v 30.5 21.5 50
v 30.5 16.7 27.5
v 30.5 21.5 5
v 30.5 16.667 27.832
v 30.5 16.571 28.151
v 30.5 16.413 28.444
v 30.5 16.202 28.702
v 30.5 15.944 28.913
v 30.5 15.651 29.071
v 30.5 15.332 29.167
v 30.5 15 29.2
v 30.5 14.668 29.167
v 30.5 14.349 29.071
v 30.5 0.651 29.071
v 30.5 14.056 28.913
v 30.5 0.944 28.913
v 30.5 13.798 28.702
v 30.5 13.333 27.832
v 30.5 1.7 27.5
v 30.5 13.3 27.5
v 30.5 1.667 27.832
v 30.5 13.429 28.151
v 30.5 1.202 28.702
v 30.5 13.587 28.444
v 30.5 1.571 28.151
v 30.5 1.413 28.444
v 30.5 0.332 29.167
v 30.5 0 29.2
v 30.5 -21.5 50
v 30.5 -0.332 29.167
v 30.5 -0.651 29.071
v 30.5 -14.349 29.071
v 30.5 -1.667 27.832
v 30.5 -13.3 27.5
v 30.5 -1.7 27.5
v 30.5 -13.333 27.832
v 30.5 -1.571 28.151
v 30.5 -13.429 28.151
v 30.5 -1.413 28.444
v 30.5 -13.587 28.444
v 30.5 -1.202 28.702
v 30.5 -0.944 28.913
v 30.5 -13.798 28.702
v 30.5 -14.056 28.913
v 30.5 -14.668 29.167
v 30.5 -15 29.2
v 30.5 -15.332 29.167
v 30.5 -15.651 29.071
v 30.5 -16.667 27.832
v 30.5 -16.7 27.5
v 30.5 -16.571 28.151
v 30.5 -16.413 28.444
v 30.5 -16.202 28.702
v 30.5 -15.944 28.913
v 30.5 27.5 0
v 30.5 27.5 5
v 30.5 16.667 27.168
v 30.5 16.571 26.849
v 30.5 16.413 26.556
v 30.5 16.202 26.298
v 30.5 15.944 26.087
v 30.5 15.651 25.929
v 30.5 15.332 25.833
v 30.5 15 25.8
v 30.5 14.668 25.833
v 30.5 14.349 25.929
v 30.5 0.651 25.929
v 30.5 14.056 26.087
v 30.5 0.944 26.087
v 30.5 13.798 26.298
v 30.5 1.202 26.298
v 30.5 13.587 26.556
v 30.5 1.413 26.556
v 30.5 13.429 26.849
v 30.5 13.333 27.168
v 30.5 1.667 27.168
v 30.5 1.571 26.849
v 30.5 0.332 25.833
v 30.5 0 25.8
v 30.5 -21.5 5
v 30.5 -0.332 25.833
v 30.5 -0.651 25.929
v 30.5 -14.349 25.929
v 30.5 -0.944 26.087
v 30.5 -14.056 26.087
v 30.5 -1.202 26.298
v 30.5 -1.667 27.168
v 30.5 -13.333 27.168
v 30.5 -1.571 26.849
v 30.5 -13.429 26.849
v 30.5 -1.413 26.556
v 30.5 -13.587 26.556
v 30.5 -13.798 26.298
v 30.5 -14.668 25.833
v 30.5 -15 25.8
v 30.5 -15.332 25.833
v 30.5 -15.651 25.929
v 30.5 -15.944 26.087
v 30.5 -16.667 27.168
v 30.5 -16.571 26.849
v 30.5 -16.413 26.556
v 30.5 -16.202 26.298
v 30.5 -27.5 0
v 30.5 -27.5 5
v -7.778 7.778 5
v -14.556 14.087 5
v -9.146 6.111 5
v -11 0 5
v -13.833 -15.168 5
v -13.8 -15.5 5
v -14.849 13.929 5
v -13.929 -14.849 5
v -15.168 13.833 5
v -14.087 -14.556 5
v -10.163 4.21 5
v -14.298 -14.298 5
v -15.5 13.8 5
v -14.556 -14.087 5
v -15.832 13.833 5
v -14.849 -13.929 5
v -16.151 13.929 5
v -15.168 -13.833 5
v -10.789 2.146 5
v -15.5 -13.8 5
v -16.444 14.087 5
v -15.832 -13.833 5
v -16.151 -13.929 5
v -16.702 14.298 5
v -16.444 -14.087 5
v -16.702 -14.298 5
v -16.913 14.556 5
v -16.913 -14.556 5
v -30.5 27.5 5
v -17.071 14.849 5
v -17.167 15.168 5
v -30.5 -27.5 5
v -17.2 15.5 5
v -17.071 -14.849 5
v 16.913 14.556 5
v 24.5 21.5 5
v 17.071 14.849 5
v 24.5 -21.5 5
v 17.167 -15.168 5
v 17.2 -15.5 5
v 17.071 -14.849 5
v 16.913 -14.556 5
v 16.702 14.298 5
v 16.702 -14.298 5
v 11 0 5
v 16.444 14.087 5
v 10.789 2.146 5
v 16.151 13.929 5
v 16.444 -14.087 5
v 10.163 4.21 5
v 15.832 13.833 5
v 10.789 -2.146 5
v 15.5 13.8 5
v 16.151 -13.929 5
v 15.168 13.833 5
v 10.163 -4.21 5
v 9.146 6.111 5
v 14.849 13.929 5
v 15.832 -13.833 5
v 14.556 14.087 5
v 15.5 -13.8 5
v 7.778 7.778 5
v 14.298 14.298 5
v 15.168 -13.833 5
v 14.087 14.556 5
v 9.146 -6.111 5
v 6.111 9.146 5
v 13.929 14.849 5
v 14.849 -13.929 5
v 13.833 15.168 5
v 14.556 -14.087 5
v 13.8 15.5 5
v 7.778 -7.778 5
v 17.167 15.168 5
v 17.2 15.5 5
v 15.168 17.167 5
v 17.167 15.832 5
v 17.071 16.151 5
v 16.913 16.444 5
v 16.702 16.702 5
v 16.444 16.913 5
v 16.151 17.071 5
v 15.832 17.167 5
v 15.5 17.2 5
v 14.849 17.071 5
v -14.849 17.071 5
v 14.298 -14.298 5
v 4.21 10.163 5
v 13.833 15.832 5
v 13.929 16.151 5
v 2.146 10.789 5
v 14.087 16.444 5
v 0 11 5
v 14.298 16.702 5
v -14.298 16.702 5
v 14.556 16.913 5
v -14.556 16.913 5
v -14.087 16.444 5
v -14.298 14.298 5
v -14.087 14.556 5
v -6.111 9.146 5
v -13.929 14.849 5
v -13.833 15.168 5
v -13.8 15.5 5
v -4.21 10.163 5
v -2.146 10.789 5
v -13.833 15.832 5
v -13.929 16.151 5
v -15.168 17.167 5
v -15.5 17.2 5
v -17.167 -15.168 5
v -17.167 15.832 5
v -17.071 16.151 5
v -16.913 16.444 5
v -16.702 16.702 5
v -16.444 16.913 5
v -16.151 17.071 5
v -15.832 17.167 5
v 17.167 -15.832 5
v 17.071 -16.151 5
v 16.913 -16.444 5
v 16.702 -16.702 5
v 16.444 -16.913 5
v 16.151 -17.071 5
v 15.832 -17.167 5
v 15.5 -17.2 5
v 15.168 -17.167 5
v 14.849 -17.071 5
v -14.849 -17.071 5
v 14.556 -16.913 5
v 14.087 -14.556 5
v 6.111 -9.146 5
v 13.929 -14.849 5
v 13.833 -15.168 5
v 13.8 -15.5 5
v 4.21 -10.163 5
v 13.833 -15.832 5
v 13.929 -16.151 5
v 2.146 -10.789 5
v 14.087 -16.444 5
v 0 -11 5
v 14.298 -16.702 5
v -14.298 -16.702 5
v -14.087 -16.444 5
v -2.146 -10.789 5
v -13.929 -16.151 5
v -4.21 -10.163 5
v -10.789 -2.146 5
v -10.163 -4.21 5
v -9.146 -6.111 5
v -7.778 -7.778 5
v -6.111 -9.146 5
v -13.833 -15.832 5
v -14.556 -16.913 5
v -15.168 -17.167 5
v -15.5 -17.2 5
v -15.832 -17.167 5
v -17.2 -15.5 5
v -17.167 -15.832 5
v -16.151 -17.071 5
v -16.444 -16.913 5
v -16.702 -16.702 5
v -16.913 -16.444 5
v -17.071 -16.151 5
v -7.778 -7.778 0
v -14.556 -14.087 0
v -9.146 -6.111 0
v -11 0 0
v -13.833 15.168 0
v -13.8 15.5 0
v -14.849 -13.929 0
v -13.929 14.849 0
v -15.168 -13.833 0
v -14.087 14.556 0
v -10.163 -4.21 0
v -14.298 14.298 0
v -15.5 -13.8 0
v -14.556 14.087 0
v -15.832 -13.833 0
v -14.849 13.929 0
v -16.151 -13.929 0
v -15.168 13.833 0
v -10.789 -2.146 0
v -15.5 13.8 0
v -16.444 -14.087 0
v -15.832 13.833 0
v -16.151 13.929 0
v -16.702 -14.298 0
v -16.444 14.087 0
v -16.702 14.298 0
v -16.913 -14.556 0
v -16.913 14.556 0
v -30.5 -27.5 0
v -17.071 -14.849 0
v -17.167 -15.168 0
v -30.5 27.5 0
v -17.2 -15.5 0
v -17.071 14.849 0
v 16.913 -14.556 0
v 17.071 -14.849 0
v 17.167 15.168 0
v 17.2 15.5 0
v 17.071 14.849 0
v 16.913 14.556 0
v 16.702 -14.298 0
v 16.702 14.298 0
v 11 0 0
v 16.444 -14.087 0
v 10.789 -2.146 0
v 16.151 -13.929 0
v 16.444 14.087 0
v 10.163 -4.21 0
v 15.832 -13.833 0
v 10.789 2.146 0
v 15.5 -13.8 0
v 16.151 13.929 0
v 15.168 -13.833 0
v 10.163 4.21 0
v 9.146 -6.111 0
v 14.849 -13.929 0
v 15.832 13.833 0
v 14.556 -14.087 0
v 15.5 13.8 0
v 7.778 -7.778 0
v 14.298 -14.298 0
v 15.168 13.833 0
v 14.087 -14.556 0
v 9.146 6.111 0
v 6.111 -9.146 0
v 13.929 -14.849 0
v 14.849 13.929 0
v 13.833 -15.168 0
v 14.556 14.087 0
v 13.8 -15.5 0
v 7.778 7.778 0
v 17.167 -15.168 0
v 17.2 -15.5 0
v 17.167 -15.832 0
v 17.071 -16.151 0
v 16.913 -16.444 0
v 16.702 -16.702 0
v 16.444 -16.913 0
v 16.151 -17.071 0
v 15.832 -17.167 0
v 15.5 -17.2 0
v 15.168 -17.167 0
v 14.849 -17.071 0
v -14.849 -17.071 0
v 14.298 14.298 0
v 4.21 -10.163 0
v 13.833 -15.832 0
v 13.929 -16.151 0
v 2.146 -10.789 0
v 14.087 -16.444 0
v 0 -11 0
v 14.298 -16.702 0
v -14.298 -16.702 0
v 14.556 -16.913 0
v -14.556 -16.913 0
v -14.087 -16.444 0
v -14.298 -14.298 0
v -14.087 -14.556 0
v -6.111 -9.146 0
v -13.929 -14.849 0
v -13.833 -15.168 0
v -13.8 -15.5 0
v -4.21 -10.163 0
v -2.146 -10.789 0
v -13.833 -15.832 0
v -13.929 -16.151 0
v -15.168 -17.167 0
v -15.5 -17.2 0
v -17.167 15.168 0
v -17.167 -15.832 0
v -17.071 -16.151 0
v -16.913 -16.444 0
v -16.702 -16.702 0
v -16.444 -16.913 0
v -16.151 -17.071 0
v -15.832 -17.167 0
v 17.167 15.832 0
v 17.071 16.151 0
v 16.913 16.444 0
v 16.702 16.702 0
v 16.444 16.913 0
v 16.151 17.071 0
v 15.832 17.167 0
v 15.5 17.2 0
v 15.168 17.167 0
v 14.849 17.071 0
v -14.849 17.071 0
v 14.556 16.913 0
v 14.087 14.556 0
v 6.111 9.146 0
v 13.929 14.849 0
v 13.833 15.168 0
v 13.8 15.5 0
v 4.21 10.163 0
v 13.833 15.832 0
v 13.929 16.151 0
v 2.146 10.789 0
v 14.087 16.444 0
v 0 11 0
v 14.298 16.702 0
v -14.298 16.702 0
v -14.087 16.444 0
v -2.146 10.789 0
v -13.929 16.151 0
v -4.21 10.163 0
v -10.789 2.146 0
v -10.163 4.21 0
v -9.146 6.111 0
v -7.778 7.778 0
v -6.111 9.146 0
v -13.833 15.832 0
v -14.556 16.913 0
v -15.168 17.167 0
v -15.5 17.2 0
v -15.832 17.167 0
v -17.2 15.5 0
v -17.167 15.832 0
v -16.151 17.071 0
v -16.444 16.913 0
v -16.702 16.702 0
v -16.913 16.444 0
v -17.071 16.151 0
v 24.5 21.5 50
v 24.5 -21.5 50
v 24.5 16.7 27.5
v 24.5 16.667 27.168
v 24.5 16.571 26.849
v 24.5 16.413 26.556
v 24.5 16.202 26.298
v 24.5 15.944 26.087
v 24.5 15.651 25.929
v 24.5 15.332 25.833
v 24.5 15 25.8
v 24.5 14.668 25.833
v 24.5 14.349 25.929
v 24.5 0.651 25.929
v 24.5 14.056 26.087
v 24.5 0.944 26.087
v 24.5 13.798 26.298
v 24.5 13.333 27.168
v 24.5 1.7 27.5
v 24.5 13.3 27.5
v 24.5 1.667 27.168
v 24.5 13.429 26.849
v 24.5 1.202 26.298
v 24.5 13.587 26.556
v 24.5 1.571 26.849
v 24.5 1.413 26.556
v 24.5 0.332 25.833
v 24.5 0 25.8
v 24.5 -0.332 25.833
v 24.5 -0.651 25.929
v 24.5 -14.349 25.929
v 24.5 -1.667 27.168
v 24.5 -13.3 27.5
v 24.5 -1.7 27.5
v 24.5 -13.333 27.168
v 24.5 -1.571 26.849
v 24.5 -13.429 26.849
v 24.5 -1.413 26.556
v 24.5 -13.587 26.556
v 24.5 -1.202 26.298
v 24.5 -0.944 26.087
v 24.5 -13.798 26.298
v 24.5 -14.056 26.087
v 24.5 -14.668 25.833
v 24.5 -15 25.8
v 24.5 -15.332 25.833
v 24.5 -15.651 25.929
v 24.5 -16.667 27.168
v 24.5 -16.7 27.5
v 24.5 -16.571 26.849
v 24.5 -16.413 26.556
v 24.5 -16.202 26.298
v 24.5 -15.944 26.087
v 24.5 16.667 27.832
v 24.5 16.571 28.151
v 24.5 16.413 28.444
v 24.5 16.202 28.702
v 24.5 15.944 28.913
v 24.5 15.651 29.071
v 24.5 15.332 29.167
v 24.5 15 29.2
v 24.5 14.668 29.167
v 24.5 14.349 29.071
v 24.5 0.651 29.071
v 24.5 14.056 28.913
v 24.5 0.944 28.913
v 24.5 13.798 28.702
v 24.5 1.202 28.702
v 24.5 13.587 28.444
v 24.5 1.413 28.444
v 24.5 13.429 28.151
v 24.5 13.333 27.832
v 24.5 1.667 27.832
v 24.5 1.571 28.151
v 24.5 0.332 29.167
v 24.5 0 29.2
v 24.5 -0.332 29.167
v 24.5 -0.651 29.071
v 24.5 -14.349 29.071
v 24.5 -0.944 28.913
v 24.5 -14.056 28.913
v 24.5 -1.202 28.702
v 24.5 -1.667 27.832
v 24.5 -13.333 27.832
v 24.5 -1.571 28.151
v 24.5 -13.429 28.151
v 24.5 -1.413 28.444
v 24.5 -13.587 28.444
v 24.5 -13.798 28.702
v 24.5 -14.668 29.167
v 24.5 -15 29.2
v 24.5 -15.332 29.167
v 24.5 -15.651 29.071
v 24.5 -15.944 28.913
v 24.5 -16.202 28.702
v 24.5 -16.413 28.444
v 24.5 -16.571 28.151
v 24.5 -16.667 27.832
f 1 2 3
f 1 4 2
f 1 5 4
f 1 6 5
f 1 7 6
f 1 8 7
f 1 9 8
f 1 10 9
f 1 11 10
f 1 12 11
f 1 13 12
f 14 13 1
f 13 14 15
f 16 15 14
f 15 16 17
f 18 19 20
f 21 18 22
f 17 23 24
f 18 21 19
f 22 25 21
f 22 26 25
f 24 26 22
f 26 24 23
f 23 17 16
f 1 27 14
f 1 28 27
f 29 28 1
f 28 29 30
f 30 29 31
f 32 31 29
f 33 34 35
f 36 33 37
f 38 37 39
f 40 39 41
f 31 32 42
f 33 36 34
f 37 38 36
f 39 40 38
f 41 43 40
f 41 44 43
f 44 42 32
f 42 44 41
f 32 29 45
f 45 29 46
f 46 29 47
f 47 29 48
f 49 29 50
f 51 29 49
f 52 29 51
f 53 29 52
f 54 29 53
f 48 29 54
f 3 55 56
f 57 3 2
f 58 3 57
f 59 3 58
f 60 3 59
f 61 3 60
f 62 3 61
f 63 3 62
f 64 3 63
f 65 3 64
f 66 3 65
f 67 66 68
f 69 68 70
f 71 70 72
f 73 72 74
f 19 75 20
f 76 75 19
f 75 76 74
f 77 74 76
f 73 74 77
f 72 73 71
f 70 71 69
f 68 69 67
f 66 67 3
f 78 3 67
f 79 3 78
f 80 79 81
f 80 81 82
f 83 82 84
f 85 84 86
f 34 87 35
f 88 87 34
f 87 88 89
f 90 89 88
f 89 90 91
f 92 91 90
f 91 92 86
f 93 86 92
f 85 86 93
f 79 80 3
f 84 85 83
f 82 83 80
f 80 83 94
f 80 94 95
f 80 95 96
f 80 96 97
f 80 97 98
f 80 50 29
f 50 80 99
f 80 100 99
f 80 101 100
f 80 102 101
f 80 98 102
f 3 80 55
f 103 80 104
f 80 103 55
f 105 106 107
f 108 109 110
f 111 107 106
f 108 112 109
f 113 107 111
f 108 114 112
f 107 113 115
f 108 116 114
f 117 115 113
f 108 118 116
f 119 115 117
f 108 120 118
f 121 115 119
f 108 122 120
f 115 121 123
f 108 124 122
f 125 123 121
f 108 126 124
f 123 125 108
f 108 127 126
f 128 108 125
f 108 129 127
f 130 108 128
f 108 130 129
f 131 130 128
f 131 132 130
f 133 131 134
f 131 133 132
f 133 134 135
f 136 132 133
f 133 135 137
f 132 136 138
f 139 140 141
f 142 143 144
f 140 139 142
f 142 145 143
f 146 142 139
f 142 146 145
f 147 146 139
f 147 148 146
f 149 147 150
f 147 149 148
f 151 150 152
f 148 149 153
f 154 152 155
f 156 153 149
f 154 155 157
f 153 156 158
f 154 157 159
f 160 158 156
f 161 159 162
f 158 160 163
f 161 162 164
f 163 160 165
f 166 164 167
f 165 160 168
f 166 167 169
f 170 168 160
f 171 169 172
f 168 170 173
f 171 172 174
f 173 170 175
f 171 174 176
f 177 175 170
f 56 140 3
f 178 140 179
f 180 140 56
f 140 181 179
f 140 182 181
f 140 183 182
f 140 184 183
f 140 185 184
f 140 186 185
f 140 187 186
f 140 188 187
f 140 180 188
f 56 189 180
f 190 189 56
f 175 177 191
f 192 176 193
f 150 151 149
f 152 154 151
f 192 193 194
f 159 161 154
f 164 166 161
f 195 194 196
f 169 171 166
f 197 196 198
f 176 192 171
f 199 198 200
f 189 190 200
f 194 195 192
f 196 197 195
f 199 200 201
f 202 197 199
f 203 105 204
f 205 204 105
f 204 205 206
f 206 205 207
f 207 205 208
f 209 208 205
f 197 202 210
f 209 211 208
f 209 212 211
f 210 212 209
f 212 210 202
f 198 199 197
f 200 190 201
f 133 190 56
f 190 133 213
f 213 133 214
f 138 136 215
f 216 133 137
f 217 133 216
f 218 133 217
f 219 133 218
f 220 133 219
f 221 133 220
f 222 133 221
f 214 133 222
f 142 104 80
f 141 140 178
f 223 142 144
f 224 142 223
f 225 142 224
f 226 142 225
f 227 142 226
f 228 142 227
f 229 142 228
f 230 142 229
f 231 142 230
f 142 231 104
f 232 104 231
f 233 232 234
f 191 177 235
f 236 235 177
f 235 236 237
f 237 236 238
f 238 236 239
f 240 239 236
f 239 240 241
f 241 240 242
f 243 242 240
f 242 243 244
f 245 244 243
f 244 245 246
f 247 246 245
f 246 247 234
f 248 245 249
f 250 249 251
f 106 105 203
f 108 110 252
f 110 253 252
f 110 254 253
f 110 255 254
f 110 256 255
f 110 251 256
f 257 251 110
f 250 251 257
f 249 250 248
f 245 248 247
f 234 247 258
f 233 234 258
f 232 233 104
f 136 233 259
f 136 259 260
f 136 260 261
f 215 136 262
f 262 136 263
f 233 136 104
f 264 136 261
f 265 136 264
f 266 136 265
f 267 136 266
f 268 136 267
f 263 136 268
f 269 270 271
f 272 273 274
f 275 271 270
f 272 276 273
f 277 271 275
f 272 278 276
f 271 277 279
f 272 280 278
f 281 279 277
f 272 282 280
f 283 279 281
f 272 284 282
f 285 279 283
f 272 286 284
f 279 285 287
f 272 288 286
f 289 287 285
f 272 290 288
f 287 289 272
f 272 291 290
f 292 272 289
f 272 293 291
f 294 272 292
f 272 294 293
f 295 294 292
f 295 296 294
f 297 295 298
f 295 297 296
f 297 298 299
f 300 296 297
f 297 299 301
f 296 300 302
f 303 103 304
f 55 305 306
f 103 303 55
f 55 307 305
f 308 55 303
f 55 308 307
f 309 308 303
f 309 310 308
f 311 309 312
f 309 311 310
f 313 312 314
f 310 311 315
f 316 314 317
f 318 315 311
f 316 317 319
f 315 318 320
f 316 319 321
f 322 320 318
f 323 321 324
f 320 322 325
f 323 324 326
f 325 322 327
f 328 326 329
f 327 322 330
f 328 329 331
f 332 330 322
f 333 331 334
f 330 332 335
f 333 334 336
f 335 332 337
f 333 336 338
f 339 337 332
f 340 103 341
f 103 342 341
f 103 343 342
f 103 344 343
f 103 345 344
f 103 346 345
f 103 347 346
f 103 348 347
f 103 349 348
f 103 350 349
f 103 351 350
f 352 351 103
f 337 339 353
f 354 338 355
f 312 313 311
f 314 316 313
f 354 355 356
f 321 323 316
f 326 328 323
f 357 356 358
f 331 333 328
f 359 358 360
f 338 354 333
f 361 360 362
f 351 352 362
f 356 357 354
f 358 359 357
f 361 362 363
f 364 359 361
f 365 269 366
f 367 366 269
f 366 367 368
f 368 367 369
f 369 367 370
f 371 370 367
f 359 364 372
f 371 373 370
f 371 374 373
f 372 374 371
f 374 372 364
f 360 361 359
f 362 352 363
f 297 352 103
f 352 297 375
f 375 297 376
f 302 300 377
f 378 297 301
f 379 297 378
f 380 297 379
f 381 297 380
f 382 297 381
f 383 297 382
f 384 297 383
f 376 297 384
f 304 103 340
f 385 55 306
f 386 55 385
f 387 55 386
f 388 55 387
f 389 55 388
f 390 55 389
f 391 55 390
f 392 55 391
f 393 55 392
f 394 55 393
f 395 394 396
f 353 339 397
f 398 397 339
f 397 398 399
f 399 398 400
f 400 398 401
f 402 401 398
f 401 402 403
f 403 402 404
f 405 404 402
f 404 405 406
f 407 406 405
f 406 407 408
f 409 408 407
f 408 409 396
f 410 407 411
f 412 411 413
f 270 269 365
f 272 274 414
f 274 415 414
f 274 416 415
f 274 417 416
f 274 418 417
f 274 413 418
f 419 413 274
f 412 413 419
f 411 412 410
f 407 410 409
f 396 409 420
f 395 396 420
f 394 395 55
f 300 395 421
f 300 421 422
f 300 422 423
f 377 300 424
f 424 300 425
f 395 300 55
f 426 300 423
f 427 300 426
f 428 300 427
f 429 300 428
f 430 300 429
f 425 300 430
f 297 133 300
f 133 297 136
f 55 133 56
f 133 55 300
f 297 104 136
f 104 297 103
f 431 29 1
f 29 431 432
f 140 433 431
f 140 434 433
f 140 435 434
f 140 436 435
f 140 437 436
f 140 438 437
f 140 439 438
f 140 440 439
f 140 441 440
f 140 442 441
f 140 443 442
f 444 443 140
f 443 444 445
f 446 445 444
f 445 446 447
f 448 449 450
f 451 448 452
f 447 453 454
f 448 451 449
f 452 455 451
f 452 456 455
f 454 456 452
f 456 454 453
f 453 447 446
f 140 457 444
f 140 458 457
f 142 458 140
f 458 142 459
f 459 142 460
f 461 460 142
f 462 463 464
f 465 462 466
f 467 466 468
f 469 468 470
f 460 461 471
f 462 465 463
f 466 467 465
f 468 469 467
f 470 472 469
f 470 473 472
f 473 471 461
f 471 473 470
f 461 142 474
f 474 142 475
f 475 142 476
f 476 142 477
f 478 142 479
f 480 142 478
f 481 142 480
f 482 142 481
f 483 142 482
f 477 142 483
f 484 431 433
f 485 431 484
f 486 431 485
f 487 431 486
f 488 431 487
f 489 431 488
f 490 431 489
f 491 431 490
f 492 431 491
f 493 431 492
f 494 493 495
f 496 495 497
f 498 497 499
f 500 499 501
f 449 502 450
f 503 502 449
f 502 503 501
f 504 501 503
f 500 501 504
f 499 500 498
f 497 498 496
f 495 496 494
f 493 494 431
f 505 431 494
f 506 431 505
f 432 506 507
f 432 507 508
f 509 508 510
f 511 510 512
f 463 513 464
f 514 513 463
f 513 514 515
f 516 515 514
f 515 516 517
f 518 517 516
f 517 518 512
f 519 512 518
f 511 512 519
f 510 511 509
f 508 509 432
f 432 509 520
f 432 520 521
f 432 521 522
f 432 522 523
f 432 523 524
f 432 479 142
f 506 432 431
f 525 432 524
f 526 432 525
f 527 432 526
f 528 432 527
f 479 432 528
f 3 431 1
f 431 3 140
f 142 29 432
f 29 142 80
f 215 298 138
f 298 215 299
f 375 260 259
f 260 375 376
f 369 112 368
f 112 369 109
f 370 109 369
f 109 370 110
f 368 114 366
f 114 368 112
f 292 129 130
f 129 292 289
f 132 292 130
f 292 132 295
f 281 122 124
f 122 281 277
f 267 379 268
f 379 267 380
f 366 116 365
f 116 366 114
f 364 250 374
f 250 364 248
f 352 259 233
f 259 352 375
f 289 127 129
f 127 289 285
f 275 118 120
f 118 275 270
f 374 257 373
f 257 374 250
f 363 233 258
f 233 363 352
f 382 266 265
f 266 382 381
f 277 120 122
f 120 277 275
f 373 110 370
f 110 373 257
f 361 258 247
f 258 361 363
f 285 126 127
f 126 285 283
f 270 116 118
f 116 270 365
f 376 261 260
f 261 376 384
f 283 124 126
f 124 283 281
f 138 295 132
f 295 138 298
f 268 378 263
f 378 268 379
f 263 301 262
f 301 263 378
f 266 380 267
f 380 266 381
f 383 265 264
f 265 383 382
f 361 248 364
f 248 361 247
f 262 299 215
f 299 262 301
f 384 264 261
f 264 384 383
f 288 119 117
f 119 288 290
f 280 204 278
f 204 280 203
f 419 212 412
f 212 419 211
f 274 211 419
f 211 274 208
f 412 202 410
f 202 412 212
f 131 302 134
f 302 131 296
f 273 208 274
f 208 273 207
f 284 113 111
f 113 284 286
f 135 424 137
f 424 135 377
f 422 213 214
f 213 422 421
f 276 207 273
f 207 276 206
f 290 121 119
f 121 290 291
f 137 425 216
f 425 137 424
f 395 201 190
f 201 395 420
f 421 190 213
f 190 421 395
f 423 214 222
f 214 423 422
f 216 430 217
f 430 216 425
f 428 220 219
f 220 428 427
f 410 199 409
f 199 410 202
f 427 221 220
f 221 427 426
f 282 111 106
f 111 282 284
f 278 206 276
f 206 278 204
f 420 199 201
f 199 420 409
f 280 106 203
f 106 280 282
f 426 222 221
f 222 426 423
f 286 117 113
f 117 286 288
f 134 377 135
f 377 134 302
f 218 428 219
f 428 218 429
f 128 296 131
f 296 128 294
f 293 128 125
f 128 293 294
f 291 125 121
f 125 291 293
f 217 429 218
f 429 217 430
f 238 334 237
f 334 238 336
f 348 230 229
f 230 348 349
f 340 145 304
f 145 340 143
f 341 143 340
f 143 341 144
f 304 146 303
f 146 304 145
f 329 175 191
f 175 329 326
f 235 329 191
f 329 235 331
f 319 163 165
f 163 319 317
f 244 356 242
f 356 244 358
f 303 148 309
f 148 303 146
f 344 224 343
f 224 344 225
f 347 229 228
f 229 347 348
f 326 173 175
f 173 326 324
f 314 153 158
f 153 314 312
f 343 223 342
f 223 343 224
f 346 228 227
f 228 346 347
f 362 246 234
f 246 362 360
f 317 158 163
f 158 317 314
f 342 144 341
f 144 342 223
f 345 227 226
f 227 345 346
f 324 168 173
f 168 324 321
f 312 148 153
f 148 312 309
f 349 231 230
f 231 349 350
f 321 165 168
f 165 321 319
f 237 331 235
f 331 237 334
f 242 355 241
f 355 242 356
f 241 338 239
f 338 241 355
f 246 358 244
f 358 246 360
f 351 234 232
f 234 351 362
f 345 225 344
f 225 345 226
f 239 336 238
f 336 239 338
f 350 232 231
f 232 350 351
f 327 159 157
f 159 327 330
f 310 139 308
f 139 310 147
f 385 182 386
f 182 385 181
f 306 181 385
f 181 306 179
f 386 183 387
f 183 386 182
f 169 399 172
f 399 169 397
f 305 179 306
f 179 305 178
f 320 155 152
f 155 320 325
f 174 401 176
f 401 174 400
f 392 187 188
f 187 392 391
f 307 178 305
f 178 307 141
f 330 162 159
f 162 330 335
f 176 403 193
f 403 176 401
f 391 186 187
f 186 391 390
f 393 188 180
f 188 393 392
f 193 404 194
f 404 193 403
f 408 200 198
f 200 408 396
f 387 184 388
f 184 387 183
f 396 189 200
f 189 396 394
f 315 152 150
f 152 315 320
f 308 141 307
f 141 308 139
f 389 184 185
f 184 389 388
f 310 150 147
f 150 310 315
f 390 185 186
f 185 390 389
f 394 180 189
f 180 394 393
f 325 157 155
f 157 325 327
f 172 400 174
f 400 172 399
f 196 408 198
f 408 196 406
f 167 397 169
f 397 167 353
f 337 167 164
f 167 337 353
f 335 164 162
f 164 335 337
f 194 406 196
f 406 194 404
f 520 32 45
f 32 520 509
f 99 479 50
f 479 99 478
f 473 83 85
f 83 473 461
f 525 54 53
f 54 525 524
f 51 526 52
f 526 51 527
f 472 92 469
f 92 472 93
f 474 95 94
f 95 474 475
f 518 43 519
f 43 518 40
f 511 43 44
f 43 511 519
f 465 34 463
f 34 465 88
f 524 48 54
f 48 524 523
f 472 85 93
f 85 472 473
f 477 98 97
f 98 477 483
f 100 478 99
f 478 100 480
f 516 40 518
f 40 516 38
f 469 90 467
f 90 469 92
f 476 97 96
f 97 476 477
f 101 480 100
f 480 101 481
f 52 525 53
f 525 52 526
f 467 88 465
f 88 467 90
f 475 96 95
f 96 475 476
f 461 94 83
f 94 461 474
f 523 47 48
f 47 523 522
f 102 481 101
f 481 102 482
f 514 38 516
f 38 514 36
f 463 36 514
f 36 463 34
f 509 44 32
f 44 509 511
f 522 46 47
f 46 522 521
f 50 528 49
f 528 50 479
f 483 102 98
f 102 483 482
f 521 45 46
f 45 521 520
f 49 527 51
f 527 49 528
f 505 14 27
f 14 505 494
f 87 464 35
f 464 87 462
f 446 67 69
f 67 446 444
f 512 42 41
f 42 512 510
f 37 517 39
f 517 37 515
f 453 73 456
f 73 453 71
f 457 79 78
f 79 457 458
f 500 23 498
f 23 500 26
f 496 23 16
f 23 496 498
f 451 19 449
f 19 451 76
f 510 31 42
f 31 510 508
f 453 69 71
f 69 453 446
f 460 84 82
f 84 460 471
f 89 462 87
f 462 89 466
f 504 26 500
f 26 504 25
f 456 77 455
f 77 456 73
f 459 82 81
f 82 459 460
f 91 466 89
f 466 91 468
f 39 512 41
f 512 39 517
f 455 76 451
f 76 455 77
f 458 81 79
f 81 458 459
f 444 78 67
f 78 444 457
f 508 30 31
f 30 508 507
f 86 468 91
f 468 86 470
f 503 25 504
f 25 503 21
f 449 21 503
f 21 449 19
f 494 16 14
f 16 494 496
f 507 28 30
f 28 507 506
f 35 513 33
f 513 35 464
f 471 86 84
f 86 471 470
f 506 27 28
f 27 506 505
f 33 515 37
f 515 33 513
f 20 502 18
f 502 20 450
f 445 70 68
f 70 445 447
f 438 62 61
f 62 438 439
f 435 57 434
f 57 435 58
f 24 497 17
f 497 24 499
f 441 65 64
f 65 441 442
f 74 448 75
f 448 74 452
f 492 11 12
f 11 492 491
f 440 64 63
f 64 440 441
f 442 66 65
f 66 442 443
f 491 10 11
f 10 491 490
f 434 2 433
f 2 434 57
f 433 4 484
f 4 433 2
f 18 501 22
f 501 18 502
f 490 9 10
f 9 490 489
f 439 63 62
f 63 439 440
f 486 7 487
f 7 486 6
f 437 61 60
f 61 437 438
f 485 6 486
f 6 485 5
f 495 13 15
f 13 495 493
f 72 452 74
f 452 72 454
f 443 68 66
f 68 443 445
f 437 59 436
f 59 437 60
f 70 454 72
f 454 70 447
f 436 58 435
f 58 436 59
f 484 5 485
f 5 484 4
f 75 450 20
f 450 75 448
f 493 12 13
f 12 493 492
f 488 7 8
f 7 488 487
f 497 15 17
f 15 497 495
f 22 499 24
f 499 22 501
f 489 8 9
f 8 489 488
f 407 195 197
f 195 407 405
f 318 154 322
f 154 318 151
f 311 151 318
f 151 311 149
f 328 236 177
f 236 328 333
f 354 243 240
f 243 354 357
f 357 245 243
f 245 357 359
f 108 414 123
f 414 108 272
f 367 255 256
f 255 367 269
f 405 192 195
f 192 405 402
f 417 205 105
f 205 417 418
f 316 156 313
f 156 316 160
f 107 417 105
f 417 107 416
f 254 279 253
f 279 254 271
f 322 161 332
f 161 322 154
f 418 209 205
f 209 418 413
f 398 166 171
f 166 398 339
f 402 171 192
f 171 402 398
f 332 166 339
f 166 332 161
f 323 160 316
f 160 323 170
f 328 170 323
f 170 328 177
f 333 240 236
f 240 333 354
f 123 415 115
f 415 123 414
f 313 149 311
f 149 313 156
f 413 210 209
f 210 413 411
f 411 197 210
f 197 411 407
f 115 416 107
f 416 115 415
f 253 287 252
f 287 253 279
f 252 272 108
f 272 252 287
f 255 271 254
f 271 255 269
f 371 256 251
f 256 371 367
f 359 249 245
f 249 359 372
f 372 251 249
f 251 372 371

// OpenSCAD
$fn = 32;

// ----------------------------------------------------------------------
// Motor mount plate: NEMA17, 61 x 55 x 55 mm
// ----------------------------------------------------------------------

// --- parameters (mm) ---
plate_w = 61;             // plate length, X
plate_d = 55;             // plate width, Y
plate_t = 5;              // plate thickness
pattern = 31;             // NEMA17 bolt spacing
motor_d = 3.4;            // NEMA17 screw clearance
pilot_d = 22;             // pilot boss bore
second_d = 3.4;           // second fastener hole
wall_h = 50;              // upright height
wall_t = 6;               // upright thickness

module plate() {
  translate([-plate_w / 2, -plate_d / 2, 0]) cube([plate_w, plate_d, plate_t]);
}

module motor_holes() {
  for (sx = [-1, 1]) for (sy = [-1, 1])
    translate([sx * pattern / 2, sy * pattern / 2, -1])
      cylinder(h = plate_t + 2, d = motor_d);
}
module upright() {
  /* wall sunk 1 mm into the plate for a positive overlap */
  translate([plate_w / 2 - wall_t, -plate_d / 2 + wall_t, plate_t - 1])
    cube([wall_t, plate_d - 2 * wall_t, wall_h - plate_t + 1]);
}

difference() {
  union() {
    plate();
    upright();
  }
  motor_holes();
  translate([0, 0, -1]) cylinder(h = plate_t + 2, d = pilot_d);
  for (i = [0 : 2])
    translate([plate_w / 2 - wall_t - 1, (i - 1) * wall_h * 0.3, plate_t + wall_h * 0.45]) rotate([0, 90, 0]) cylinder(h = wall_t + 2, d = second_d);
}
